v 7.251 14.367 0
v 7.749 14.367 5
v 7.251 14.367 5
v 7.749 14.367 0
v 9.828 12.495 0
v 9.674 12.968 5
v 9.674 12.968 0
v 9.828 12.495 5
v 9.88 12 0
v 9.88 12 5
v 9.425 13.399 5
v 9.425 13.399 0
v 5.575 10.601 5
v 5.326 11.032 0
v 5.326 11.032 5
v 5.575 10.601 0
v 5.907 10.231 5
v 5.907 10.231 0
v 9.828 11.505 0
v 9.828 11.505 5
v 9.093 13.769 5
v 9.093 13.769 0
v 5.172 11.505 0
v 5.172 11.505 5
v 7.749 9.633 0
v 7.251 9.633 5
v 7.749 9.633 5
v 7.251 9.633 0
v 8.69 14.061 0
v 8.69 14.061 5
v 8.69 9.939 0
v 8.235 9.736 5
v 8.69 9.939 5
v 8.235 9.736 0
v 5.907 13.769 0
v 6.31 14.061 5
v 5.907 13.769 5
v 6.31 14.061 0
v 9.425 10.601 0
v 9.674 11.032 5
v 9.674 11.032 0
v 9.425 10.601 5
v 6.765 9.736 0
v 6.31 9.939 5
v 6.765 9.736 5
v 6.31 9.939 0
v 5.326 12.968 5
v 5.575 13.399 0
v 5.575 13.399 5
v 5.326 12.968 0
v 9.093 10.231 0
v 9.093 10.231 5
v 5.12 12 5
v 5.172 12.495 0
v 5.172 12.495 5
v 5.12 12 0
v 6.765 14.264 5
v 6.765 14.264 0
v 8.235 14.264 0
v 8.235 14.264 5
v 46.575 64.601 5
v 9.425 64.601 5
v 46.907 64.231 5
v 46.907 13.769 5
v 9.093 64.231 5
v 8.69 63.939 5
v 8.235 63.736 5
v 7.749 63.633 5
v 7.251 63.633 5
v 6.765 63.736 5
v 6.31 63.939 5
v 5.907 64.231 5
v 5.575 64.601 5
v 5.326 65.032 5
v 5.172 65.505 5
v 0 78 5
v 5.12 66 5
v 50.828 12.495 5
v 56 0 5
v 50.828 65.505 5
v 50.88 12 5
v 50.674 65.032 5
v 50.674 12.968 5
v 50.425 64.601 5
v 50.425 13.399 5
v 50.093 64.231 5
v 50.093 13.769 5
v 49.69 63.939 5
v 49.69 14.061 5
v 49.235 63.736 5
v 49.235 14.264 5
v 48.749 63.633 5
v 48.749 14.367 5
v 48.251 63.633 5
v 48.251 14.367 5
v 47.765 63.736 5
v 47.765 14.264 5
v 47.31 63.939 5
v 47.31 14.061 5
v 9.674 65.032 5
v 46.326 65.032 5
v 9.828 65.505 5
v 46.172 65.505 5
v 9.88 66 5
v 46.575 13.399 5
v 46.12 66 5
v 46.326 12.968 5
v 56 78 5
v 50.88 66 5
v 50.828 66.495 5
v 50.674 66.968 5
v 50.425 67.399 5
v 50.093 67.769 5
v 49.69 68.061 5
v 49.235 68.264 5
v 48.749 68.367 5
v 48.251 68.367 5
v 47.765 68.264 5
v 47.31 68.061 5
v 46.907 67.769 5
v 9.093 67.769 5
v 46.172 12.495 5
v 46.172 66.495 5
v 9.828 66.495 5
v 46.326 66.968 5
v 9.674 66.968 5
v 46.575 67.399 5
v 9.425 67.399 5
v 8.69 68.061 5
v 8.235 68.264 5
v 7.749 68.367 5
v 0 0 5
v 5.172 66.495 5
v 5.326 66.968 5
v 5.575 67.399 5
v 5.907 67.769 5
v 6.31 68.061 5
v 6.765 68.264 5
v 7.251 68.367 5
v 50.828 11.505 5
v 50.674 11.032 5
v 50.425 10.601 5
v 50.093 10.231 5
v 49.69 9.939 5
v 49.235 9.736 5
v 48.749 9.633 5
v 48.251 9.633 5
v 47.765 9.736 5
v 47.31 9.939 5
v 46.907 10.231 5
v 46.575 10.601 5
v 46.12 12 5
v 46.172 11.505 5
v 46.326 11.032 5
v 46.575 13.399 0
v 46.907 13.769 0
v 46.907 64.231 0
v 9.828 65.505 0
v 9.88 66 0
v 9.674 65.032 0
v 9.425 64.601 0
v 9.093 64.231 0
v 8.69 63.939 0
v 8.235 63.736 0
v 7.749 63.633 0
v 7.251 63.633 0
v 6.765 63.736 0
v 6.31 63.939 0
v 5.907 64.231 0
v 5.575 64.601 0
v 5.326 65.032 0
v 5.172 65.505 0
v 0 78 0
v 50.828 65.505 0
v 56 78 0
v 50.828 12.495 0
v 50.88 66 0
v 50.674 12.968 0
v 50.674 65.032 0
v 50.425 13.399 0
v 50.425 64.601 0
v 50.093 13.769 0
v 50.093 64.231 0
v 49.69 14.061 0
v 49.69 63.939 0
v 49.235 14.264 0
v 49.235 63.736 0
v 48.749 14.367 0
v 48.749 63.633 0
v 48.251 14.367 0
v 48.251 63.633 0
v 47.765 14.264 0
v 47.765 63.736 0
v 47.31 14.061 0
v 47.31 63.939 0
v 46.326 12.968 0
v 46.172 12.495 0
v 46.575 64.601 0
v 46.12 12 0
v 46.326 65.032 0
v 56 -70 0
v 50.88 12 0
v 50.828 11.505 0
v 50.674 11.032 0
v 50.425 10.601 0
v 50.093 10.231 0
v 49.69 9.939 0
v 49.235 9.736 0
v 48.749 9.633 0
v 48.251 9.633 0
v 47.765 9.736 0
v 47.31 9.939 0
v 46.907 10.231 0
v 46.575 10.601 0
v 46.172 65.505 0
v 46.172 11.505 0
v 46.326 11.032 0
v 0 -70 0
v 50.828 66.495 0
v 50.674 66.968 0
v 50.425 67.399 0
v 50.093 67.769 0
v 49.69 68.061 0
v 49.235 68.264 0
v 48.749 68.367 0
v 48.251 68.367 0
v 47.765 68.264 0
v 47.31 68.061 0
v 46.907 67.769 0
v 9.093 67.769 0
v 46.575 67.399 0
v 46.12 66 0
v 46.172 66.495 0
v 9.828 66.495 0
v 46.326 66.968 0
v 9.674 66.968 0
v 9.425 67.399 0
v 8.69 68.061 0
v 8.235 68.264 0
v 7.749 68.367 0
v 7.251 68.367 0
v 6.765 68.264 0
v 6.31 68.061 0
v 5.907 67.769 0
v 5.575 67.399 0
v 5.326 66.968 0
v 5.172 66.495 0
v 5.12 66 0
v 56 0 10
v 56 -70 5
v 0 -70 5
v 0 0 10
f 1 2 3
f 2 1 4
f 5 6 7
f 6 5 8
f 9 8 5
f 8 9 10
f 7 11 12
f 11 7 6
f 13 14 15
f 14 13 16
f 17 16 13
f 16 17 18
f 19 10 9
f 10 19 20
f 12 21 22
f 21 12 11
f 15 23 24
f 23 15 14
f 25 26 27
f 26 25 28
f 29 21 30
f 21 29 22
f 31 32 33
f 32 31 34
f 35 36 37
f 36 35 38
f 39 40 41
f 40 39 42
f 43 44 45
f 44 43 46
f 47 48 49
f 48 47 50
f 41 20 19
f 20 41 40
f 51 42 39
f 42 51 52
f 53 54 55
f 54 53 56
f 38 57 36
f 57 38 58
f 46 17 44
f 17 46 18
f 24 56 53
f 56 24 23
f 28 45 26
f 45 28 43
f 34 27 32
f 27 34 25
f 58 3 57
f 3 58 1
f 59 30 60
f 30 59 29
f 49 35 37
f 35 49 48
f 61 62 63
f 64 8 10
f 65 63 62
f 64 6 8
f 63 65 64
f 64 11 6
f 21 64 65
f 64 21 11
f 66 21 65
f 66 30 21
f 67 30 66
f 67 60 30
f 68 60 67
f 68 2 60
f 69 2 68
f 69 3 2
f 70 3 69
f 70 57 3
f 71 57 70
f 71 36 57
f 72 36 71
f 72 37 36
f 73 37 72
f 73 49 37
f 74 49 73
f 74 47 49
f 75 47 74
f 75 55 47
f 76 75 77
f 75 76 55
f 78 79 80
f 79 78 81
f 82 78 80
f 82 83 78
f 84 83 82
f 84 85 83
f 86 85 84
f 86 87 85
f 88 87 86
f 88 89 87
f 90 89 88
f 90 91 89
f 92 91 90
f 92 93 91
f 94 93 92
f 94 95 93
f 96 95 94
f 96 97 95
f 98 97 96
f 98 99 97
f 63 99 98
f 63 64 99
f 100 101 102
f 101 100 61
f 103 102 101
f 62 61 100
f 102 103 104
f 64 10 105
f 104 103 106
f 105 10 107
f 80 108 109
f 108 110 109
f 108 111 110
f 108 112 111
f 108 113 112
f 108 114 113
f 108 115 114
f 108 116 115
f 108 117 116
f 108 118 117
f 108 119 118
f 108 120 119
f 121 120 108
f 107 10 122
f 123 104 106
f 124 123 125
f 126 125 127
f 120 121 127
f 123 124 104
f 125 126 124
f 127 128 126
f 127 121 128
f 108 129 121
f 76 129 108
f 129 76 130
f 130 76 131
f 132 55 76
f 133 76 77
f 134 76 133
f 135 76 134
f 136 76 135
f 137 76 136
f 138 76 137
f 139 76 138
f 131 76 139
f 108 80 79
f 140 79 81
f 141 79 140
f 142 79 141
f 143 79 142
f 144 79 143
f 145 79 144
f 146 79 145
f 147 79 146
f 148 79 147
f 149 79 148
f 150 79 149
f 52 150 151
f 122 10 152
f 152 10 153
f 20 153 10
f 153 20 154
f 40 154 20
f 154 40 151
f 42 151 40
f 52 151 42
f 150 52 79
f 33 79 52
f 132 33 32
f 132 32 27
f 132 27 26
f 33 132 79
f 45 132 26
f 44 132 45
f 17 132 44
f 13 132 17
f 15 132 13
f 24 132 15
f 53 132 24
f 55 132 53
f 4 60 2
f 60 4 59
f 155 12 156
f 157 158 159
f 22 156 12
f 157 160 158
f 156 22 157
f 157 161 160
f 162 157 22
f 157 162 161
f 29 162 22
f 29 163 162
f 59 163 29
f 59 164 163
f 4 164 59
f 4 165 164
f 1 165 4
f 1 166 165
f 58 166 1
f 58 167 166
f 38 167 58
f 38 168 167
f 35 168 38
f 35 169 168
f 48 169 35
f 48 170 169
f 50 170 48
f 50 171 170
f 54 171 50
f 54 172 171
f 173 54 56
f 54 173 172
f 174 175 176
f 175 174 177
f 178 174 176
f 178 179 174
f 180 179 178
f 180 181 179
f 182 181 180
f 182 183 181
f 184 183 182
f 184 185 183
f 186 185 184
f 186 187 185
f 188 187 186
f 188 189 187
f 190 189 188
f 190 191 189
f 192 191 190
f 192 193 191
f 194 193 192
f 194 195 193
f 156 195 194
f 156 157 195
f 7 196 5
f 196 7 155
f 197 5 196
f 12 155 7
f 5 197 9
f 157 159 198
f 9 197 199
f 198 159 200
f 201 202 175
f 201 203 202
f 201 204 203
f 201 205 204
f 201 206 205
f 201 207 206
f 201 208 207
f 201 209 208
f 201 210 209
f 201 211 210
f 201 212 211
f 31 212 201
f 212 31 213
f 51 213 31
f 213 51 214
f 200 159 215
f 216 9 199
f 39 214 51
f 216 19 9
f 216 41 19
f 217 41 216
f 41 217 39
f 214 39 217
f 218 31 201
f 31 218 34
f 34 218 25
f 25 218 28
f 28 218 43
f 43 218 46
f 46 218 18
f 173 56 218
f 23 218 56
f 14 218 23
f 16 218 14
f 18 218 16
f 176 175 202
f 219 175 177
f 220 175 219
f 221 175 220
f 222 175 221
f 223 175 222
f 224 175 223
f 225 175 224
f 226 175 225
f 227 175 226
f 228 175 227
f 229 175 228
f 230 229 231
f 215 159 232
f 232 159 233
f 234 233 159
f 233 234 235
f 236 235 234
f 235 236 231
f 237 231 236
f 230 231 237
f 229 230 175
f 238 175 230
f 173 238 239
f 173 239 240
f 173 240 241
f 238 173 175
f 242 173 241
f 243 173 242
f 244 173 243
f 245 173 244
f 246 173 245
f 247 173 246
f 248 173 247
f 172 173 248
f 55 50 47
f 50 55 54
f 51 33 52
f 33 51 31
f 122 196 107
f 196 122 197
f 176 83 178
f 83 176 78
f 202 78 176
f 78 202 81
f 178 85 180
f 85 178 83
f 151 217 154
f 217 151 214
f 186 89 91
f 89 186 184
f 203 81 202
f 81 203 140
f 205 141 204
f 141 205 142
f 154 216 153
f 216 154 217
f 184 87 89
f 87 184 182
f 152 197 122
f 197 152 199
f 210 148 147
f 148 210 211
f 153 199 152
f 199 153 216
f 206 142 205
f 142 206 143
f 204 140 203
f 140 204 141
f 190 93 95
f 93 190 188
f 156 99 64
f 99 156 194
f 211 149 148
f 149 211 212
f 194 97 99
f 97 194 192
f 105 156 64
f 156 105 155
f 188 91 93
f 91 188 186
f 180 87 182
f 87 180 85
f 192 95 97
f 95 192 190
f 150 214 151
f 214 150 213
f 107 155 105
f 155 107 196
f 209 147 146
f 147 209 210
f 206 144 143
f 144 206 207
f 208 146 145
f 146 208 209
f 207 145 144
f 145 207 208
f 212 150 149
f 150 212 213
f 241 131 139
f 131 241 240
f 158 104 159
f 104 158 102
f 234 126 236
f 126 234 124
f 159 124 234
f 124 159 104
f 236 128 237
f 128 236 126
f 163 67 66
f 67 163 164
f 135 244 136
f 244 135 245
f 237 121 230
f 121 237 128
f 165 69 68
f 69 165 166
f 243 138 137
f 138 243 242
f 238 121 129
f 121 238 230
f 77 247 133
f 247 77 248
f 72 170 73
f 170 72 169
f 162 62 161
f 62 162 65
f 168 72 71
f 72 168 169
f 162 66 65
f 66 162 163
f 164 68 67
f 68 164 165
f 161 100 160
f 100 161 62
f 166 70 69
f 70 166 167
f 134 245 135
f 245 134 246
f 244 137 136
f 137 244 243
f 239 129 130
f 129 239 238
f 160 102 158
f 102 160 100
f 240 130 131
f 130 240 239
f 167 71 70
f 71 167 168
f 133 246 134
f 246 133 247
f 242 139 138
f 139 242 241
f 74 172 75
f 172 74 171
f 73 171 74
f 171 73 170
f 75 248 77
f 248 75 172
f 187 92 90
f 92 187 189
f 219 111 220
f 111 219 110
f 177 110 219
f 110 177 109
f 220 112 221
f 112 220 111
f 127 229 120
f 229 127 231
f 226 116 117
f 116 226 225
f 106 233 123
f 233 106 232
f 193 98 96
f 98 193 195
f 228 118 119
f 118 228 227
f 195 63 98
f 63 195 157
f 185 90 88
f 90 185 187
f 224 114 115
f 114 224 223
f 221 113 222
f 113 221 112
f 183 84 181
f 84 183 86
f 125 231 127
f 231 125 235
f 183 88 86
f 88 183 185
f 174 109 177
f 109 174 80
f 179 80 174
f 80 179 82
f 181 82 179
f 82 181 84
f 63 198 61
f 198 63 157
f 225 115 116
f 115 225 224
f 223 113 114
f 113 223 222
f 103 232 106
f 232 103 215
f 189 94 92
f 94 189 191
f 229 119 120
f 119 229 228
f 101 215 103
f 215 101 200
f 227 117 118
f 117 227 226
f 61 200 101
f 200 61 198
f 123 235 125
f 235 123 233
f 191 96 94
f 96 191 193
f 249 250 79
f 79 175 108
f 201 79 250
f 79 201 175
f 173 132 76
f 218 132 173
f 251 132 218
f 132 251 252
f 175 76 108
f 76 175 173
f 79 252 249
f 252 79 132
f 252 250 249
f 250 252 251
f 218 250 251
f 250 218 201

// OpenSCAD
baseThickness = 5;


module truckMount() {
	width = 56;
	length = 78;

	// separation between screwholes
	cylWidth = 41;
	cylLength = 54;

	difference() {
		cube([width, length, baseThickness]);
		translate([(width - cylWidth)/2, (length - cylLength)/2, 0]) {
			cylinder(h=baseThickness, r=2.38, center=false, $fn=30);
			translate([cylWidth, 0, 0]) {
				cylinder(h=baseThickness, r=2.38, center=false, $fn=30);
			}
			translate([0, cylLength, 0]) {
				cylinder(h=baseThickness, r=2.38, center=false, $fn=30);
			}
			translate([cylWidth, cylLength, 0]) {
				cylinder(h=baseThickness, r=2.38, center=false, $fn=30);
			}
		}
	}
}



module triangle(o_len, a_len, depth)
{
	linear_extrude(height=depth)
	{
		polygon(points=[[0,0],[a_len,0],[0,o_len]], paths=[[0,1,2]]);
	}
}

module bumper() {
	length = 70;
	width = 56;
	
	translate([width,0,baseThickness]) {	
		mirror([0,1,0]) {
			rotate([0, -90, 0]) {
				triangle(length, 5, width);
			}
		}
	}

	translate([0,-length,0]) {
		cube([width, length, baseThickness]);
	}
}

truckMount();
bumper();
